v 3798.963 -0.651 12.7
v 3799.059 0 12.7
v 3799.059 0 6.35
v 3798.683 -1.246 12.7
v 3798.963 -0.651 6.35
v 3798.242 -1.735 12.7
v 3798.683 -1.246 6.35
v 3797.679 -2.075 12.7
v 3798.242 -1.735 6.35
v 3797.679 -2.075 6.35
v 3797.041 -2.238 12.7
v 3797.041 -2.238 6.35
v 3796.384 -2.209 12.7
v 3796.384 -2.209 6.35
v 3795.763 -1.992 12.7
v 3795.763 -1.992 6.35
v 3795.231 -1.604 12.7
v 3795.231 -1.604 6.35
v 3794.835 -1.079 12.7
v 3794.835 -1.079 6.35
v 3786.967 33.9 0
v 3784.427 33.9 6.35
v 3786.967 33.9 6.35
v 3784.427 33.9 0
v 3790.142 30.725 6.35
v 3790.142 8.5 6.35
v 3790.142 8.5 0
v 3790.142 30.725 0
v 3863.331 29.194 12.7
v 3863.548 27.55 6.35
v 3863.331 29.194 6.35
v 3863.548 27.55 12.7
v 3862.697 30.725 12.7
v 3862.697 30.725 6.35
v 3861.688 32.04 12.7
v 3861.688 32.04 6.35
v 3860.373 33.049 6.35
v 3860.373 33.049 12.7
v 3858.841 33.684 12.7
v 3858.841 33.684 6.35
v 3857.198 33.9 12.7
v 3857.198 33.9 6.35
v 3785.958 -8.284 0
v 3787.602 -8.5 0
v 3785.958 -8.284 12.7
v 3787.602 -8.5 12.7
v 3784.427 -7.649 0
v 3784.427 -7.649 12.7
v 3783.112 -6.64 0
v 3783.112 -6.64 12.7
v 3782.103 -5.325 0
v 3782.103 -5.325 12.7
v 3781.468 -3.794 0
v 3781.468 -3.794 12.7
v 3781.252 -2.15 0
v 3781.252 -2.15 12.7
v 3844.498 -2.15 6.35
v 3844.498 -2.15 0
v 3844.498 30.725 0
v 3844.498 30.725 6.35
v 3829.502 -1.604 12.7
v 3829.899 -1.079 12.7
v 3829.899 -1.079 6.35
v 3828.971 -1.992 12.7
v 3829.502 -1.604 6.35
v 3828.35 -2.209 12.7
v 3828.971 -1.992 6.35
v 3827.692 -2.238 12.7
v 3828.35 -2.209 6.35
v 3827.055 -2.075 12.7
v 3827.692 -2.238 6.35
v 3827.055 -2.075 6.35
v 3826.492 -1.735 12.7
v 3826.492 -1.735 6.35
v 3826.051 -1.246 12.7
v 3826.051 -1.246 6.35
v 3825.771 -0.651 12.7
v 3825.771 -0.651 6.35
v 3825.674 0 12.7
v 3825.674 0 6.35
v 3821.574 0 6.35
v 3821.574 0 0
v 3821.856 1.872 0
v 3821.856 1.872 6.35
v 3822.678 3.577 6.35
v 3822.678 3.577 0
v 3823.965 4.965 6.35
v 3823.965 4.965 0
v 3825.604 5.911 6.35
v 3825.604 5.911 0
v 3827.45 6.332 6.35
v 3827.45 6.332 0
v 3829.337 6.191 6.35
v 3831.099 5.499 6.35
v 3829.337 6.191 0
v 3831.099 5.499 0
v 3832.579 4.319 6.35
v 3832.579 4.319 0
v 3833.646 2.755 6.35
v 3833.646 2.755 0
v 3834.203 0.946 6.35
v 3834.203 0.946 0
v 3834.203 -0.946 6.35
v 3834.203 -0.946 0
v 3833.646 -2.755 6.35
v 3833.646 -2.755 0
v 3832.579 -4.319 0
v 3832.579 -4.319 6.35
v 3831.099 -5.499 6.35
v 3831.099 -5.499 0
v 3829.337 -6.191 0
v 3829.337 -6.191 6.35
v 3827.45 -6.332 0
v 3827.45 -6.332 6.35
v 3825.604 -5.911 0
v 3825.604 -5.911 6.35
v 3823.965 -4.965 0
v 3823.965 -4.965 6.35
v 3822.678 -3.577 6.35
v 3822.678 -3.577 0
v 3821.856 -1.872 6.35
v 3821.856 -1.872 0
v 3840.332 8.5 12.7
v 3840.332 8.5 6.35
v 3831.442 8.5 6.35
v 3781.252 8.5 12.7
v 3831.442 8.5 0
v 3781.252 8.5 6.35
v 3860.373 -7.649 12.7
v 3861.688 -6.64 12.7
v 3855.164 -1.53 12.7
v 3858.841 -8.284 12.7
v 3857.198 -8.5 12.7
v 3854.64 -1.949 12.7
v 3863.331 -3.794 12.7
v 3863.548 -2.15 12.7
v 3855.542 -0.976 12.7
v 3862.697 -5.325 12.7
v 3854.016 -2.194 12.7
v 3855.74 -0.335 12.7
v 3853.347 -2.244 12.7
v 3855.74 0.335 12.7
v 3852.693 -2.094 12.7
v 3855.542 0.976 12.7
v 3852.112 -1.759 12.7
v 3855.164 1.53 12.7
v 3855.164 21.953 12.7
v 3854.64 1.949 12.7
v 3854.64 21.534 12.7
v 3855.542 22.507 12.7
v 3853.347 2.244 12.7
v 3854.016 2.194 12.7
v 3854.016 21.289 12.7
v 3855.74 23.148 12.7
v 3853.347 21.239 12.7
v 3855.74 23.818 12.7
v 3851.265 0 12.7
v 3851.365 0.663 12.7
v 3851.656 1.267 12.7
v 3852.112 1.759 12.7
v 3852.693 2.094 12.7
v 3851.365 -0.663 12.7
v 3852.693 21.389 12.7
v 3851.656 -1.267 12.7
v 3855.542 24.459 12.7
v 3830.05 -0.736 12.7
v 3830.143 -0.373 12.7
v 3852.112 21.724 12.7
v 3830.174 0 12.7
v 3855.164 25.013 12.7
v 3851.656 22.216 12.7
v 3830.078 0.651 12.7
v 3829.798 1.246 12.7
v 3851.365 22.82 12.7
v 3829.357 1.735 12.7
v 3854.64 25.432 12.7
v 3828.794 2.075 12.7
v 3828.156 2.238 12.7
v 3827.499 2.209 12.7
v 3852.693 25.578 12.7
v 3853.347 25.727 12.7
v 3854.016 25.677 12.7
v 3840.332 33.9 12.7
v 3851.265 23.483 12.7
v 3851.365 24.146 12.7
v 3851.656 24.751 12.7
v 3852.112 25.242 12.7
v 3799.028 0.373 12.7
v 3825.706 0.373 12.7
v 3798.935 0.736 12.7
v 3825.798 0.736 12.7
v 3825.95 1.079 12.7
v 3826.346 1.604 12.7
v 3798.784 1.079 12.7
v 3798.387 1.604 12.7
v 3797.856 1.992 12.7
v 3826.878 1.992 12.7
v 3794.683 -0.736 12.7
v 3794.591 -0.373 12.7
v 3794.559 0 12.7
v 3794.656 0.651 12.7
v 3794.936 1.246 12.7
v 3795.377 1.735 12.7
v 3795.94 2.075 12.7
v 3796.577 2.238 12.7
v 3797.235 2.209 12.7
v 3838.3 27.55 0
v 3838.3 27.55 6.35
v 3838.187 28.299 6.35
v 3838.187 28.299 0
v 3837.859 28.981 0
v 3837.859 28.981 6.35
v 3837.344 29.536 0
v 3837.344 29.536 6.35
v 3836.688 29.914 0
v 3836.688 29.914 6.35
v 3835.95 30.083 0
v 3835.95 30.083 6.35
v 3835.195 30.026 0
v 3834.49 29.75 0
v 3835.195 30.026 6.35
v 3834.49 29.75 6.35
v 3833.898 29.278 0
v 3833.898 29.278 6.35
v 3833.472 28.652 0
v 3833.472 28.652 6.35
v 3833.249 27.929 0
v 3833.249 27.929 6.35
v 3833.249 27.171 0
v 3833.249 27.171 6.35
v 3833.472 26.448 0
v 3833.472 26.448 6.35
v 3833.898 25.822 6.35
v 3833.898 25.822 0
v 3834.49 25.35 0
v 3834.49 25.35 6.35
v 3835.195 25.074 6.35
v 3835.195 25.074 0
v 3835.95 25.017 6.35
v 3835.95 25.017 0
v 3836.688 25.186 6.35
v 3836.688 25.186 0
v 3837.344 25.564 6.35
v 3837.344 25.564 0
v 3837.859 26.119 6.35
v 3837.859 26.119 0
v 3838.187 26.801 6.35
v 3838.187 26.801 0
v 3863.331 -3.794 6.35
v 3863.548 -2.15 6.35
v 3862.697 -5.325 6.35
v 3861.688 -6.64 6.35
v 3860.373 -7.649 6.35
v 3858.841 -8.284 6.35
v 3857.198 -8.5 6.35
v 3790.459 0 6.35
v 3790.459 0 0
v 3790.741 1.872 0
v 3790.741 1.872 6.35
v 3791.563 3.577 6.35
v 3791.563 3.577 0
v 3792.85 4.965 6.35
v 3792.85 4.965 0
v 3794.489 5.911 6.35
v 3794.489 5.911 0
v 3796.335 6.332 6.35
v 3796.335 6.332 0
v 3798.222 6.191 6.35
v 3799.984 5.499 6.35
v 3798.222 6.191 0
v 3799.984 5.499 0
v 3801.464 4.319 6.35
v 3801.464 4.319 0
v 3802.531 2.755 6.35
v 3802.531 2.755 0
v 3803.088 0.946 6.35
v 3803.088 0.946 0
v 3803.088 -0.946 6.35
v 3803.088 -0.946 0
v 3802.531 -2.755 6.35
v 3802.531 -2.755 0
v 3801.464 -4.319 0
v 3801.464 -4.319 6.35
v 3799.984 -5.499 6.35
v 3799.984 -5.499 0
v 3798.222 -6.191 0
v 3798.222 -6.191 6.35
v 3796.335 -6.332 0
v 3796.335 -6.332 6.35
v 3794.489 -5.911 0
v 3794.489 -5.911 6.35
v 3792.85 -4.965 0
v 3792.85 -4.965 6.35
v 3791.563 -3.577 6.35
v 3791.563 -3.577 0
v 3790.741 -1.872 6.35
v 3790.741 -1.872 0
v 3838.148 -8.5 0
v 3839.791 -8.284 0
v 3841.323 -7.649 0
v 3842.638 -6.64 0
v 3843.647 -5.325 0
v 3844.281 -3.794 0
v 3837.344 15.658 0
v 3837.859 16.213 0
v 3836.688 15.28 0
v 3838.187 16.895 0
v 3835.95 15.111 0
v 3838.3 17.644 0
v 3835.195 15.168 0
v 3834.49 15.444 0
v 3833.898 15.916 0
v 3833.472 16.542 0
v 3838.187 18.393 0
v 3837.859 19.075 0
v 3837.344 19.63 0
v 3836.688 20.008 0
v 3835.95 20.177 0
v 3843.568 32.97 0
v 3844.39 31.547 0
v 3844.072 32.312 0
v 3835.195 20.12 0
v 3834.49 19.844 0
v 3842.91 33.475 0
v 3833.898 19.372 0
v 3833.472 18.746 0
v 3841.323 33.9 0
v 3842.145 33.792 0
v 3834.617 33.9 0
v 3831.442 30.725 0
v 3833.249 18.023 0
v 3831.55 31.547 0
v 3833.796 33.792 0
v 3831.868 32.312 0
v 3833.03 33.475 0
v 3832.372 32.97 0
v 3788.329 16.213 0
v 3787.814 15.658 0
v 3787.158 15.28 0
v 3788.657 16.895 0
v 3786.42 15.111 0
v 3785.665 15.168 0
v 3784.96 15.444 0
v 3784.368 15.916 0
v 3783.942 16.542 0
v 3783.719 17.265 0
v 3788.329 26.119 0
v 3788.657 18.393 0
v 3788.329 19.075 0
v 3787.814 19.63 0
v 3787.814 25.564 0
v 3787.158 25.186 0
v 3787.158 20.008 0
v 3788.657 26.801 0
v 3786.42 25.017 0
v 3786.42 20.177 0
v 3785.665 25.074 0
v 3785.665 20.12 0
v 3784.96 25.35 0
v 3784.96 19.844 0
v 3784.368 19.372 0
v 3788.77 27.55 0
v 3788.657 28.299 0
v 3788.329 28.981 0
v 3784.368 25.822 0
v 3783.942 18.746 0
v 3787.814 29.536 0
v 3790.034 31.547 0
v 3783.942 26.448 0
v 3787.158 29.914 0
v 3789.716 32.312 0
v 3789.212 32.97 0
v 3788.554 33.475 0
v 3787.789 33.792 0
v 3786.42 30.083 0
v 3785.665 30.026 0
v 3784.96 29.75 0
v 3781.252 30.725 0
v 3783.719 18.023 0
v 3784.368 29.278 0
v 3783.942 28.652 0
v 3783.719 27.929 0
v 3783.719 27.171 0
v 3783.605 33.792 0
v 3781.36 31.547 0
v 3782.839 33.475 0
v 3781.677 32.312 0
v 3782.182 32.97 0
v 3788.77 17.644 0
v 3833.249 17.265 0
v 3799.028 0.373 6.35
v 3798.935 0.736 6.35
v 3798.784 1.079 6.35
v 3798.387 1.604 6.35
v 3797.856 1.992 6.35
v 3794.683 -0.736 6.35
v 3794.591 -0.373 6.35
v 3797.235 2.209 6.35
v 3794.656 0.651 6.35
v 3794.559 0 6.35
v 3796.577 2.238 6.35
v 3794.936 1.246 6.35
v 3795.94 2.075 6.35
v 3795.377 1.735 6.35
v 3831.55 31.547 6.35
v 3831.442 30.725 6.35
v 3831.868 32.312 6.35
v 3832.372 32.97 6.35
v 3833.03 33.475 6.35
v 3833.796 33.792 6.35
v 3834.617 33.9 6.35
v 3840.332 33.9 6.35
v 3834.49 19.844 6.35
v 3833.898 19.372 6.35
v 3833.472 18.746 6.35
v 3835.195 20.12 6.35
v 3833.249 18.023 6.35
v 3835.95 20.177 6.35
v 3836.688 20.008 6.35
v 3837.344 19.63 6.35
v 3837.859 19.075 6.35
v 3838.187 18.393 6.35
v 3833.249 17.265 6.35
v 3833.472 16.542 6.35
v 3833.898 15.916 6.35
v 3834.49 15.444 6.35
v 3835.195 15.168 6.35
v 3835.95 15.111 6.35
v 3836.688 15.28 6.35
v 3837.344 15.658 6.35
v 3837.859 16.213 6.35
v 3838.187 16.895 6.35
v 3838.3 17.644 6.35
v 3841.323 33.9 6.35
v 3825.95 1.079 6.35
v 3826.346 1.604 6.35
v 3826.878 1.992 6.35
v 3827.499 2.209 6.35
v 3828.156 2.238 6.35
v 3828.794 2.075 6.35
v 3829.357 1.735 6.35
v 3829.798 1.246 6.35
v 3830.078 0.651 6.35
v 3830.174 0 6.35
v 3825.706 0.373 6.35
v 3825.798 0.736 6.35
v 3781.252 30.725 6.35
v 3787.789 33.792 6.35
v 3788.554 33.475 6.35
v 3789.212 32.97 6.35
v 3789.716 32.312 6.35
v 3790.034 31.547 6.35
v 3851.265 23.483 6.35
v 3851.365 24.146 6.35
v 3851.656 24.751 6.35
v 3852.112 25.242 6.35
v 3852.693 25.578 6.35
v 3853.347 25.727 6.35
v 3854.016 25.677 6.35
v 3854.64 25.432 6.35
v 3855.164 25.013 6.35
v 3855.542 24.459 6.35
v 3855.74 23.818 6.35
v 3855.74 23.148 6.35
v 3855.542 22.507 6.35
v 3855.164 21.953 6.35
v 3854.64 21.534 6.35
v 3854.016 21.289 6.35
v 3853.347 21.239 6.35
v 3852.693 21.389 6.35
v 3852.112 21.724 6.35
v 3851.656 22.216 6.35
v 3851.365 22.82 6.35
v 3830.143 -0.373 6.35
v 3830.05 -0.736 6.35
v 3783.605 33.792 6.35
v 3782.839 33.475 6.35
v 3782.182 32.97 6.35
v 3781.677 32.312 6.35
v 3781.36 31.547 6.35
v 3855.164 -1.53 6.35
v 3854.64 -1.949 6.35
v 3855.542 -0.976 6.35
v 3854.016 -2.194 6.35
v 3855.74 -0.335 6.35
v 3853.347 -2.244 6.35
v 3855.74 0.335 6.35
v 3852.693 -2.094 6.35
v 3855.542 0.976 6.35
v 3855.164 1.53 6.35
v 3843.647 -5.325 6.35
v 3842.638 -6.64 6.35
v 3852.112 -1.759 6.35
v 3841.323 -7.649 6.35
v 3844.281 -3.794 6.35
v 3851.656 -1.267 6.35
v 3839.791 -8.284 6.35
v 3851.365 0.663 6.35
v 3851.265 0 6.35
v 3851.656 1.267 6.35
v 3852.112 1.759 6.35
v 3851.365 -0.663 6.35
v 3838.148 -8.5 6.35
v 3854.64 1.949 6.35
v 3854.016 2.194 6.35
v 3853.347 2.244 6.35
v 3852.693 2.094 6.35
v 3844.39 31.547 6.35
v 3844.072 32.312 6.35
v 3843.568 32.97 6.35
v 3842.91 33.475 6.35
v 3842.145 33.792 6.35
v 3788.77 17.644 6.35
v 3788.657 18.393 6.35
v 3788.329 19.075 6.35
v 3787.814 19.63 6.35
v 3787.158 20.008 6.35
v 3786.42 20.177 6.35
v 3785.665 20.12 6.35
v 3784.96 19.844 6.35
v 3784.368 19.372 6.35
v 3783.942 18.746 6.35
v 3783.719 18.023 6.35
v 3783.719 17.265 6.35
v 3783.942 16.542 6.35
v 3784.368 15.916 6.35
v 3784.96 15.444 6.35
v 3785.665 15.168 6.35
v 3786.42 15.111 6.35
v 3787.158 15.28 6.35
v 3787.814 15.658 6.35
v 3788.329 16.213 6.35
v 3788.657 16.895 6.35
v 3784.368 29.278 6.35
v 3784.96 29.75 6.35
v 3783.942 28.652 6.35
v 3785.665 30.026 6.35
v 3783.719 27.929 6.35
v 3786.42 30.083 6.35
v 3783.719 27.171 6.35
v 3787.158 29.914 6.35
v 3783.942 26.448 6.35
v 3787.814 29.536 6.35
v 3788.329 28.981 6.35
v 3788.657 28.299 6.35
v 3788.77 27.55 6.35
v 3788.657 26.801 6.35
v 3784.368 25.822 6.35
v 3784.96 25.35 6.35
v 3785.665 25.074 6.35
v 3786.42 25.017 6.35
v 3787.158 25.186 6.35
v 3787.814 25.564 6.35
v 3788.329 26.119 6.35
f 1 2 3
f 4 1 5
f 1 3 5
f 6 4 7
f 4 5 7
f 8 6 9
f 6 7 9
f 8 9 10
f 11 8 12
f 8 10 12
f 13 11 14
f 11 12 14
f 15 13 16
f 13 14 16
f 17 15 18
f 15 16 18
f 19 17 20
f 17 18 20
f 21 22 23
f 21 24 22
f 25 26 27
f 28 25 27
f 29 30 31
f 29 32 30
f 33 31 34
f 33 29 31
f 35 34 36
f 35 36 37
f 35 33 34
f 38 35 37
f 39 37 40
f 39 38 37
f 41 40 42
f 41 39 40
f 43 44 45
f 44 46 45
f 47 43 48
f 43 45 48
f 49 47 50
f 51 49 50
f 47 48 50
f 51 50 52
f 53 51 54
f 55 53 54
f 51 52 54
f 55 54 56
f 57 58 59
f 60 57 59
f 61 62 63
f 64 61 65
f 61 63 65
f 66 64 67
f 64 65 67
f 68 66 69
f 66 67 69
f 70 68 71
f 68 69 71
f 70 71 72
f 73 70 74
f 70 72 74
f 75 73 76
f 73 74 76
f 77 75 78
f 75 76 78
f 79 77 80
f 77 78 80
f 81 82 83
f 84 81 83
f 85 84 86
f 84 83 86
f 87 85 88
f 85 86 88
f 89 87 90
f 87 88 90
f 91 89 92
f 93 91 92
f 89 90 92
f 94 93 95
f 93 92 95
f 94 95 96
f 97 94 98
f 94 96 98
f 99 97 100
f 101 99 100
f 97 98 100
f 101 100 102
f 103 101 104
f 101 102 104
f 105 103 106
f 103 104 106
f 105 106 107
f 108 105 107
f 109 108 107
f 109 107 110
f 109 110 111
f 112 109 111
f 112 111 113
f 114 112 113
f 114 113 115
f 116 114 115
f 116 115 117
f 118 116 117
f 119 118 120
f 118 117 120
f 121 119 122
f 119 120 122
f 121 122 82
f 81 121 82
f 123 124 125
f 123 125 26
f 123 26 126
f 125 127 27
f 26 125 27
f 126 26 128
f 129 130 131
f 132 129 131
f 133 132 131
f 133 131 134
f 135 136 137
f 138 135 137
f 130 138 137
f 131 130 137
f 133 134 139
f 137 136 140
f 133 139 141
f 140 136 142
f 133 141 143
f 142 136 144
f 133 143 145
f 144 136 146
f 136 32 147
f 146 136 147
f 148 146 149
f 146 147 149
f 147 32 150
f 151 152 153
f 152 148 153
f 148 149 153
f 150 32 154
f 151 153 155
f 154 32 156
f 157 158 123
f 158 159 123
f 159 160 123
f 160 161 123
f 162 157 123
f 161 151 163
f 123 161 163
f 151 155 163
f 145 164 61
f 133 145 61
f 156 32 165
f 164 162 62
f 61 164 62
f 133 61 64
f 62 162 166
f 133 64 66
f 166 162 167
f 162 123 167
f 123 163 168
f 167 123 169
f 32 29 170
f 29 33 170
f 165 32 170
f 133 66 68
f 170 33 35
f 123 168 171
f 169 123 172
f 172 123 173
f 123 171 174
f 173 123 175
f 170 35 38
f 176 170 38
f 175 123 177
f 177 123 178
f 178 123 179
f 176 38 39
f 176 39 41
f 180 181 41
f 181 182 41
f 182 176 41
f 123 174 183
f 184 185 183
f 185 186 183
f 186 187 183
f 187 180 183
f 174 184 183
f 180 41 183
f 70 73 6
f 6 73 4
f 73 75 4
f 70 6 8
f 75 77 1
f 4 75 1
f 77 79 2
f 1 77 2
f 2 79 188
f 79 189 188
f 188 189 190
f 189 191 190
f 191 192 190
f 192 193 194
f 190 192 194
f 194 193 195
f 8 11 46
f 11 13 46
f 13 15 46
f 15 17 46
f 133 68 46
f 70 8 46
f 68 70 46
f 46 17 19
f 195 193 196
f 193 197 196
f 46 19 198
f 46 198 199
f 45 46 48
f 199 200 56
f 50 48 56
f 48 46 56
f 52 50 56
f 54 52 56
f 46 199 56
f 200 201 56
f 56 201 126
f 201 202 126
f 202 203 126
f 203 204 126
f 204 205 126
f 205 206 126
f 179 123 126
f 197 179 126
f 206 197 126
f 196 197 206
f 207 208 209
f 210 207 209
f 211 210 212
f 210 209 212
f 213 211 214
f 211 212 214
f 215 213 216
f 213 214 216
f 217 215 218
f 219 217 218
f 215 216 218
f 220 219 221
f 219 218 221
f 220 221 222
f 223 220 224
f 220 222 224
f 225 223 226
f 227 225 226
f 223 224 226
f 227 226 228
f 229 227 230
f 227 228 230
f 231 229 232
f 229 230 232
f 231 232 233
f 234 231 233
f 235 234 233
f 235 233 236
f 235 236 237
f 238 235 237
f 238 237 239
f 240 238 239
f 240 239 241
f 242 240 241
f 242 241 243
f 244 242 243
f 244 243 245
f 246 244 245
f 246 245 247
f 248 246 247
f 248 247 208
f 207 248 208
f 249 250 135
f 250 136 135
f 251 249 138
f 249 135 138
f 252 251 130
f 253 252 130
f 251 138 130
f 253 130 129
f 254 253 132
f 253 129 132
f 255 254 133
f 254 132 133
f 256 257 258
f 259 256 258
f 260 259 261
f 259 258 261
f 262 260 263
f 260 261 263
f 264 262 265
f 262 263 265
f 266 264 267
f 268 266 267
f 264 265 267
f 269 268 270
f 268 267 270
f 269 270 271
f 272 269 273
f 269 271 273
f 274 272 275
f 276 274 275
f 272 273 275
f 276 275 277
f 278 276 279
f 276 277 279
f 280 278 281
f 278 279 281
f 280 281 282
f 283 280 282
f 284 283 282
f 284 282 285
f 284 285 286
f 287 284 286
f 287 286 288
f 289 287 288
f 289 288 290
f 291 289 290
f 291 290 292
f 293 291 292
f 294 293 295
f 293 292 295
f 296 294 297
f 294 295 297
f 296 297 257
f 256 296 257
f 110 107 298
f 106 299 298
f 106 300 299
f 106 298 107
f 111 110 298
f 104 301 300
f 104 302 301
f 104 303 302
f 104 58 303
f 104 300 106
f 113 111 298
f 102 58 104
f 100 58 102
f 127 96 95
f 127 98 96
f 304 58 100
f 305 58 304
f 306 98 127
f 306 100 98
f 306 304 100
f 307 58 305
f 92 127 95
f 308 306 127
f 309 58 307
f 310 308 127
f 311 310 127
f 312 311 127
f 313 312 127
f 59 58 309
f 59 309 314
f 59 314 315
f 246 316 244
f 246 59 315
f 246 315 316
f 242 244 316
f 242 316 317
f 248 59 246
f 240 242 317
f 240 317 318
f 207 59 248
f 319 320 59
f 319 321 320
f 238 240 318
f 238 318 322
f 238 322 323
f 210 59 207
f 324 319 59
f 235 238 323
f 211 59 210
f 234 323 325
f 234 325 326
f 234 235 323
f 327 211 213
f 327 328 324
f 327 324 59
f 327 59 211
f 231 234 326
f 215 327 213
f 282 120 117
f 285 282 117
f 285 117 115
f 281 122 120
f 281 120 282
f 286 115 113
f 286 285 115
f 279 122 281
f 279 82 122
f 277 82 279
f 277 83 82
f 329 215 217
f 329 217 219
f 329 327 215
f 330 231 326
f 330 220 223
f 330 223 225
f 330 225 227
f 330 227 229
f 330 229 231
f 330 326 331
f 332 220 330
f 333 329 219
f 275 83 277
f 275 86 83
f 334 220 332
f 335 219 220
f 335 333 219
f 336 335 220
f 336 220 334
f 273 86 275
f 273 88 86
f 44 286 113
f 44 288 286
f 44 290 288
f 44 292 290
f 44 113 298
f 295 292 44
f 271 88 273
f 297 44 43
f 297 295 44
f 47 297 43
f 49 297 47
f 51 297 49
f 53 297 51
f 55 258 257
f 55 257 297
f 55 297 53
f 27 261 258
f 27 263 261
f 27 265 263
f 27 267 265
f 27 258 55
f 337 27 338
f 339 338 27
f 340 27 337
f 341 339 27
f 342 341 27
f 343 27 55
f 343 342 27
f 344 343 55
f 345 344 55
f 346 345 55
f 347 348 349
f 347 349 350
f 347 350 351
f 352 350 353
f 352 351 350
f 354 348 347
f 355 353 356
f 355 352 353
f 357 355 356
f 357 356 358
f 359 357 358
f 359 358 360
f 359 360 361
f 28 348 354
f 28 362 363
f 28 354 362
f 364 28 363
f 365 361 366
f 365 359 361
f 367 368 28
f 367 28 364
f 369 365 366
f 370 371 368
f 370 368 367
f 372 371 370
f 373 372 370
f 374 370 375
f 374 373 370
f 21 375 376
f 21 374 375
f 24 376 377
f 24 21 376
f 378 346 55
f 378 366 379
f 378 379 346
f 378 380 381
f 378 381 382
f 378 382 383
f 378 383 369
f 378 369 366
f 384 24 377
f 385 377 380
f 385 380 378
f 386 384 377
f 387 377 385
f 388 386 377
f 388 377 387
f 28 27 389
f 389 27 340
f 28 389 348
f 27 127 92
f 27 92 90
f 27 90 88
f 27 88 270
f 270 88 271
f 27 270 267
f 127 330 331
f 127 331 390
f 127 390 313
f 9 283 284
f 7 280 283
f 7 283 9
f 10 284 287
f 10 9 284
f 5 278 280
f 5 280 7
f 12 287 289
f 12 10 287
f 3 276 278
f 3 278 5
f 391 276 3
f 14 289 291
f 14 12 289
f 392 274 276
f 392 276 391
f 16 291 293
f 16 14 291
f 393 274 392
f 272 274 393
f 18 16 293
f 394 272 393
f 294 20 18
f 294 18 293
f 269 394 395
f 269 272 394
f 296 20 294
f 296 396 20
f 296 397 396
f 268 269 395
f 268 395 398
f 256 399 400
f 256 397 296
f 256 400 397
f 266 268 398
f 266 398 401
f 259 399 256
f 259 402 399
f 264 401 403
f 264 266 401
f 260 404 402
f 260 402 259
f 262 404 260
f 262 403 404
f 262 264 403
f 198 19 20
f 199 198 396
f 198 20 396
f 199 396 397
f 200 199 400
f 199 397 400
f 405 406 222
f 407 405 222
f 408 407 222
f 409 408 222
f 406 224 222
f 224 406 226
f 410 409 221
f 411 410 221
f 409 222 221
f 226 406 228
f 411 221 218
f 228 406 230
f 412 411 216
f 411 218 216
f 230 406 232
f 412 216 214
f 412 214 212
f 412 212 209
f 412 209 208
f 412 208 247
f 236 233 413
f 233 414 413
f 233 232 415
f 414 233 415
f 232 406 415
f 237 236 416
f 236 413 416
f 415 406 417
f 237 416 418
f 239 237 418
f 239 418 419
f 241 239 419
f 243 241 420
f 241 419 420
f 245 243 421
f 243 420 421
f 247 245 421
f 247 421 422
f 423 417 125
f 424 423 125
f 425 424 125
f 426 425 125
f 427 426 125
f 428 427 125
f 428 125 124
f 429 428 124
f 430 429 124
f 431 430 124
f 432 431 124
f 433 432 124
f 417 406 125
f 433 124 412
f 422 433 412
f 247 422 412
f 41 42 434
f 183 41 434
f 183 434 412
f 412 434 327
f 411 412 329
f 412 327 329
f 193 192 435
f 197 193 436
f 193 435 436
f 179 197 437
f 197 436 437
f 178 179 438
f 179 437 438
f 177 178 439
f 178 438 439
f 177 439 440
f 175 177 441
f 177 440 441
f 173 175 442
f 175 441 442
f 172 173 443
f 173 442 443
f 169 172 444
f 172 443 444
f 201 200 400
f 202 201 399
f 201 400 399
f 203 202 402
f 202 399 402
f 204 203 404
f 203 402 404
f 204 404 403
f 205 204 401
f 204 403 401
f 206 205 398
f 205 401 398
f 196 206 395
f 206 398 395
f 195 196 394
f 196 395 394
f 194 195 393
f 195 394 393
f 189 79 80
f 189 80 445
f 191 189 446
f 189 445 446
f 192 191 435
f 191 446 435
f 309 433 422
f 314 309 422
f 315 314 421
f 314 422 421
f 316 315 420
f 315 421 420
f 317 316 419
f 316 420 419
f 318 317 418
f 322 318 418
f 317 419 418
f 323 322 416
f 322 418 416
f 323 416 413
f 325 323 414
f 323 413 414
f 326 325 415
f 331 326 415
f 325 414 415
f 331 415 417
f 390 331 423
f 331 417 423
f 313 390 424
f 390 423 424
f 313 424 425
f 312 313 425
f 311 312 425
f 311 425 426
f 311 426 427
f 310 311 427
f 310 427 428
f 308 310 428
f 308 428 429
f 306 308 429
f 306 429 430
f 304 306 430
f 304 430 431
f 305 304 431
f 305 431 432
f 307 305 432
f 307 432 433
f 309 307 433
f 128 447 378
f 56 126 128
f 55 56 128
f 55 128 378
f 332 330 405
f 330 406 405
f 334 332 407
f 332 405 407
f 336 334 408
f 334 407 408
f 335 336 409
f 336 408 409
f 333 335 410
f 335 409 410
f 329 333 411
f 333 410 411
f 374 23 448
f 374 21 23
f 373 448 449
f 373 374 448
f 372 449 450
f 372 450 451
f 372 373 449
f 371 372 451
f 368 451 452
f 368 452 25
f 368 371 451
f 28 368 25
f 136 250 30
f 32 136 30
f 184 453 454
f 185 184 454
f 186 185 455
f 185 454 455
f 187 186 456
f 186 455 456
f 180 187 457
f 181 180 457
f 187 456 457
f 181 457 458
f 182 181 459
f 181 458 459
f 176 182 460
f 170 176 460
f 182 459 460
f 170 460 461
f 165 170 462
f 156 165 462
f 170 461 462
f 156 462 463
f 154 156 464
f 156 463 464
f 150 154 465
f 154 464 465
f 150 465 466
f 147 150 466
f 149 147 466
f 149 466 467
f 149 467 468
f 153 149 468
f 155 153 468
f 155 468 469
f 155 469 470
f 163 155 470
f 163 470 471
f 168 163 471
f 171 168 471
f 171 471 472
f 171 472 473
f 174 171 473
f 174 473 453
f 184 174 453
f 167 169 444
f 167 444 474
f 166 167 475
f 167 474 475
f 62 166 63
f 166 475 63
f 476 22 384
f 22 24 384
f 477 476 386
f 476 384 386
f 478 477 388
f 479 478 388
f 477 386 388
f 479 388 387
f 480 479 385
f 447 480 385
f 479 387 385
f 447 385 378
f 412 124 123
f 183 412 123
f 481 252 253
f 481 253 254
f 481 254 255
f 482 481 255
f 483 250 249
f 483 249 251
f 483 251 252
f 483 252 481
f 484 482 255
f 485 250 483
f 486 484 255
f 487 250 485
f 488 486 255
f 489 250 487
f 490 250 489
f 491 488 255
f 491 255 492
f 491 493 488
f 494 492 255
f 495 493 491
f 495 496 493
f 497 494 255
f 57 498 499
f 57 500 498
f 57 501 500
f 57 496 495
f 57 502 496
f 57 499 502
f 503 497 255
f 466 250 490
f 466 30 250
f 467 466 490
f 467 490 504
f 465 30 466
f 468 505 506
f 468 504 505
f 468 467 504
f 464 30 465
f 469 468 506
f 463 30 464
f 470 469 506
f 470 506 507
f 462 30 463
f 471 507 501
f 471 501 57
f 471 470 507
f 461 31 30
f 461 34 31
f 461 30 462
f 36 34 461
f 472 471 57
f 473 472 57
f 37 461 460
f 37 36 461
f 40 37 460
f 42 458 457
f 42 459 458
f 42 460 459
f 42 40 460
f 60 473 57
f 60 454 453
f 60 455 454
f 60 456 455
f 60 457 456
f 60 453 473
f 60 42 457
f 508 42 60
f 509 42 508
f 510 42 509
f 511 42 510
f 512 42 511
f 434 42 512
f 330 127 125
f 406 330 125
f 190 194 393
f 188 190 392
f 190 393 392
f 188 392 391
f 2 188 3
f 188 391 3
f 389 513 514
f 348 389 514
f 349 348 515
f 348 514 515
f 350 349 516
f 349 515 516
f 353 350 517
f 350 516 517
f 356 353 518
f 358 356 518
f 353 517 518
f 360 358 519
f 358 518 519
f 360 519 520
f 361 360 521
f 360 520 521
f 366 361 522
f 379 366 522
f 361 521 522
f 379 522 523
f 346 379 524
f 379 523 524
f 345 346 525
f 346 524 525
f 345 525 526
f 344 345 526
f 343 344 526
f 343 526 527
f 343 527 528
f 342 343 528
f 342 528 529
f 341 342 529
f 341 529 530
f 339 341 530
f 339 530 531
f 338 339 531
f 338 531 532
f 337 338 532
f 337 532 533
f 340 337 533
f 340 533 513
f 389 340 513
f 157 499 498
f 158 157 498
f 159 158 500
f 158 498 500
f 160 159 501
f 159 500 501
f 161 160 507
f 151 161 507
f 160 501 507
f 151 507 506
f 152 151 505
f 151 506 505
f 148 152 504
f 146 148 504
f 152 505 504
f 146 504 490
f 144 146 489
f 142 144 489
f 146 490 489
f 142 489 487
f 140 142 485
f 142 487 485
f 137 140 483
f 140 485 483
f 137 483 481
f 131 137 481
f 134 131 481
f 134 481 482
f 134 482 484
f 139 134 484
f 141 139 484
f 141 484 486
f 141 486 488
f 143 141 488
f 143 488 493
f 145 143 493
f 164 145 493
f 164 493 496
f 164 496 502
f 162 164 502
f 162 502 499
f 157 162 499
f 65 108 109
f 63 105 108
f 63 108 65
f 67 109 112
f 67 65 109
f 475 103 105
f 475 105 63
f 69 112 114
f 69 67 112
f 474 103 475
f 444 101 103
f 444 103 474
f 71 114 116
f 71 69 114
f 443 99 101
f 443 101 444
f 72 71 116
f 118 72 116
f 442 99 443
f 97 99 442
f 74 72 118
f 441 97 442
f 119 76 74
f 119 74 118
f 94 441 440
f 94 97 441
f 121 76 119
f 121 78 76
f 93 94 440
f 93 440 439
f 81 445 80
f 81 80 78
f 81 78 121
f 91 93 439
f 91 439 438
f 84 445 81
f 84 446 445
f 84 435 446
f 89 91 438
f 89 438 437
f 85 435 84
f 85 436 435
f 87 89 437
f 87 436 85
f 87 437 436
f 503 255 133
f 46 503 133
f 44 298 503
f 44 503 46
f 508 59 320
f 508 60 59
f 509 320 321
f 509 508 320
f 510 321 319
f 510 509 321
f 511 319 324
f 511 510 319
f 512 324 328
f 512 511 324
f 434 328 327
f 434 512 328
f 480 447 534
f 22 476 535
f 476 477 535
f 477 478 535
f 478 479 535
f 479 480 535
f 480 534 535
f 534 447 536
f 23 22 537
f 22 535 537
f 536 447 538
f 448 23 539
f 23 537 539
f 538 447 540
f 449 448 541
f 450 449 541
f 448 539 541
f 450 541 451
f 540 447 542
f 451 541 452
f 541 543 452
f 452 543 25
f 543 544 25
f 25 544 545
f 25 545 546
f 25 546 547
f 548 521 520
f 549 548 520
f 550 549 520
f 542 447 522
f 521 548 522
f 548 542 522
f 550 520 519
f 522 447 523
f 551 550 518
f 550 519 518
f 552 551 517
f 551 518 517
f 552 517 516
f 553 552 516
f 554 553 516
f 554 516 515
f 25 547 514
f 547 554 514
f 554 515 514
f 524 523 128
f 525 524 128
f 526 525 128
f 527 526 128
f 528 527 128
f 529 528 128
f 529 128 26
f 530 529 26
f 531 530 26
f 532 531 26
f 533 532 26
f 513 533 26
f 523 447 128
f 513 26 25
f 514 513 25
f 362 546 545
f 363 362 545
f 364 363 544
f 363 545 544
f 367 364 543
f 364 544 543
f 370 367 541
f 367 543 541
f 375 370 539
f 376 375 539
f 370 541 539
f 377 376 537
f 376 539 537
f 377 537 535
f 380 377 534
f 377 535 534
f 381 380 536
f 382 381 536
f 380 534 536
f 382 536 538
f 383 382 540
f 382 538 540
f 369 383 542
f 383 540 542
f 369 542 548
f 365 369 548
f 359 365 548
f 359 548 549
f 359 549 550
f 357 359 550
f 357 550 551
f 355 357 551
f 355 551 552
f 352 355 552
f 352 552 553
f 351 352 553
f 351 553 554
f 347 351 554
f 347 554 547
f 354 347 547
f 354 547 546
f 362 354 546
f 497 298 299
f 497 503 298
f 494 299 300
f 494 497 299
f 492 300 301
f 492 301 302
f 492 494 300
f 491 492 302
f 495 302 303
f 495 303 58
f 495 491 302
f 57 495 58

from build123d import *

# Parameters (mm, degrees)
BOSS_EXTRUDE1_DEPTH = 12.7
BOSS_EXTRUDE2_DEPTH = 25.4
SKETCH4_W           = 8.89
SKETCH4_H           = 6.35
BOSS_EXTRUDE3_DEPTH = 25.4
SKETCH5_R           = 2.54
CUT_EXTRUDE1_DEPTH  = 7.35
SKETCH6_W           = 20.066
SKETCH6_H           = 42.4
SKETCH6_R           = 2.25
BOSS_EXTRUDE4_DEPTH = 12.7
SKETCH7_R           = 6.35
SKETCH7_R_2         = 2.25
CUT_EXTRUDE2_DEPTH  = 6.35
SKETCH8_W           = 19.05
SKETCH8_H           = 42.4
CUT_EXTRUDE3_DEPTH  = 6.35
FILLET1_R           = 6.35
FILLET2_R           = 3.175


with BuildPart() as part:
    # Sketch1 → Boss-Extrude1 (new body)
    with BuildSketch(Plane.XY):
        Polygon((3833.667818581, -3.138), (3791.065892699, -3.138), (3781.25185564, -8.5), (3843.48185564, -8.5), align=None)
        with BuildLine():
            Line((3825.67435564, 0), (3799.05935564, 0))
            ThreePointArc((3799.05935564, 0), (3797.366063058, -2.180040562), (3794.834842884, -1.078795335))
            Line((3794.834842884, -1.078795335), (3791.065892699, -3.138))
            Line((3791.065892699, -3.138), (3833.667818581, -3.138))
            Line((3833.667818581, -3.138), (3829.898868396, -1.078795335))
            ThreePointArc((3829.898868396, -1.078795335), (3827.367648222, -2.180040562), (3825.67435564, 0))
        make_face()
        with BuildLine():
            Line((3843.48185564, -3.138), (3843.48185564, 0))
            Line((3843.48185564, 0), (3830.17435564, 0))
            ThreePointArc((3830.17435564, 0), (3830.104396202, -0.556707418), (3829.898868396, -1.078795335))
            Line((3829.898868396, -1.078795335), (3833.667818581, -3.138))
            Line((3833.667818581, -3.138), (3843.48185564, -3.138))
        make_face()
        Polygon((3812.36685564, 8.5), (3822.180892699, 3.138), (3843.48185564, 3.138), (3843.48185564, 8.5), align=None)
        with BuildLine():
            Line((3843.48185564, 3.138), (3822.180892699, 3.138))
            Line((3822.180892699, 3.138), (3825.949842884, 1.078795335))
            ThreePointArc((3825.949842884, 1.078795335), (3828.481063058, 2.180040562), (3830.17435564, 0))
            Line((3830.17435564, 0), (3843.48185564, 0))
            Line((3843.48185564, 0), (3843.48185564, 3.138))
        make_face()
        with BuildLine():
            Line((3822.180892699, 3.138), (3802.552818581, 3.138))
            Line((3802.552818581, 3.138), (3798.783868396, 1.078795335))
            ThreePointArc((3798.783868396, 1.078795335), (3798.989396202, 0.556707418), (3799.05935564, 0))
            Line((3799.05935564, 0), (3825.67435564, 0))
            ThreePointArc((3825.67435564, 0), (3825.744315078, 0.556707418), (3825.949842884, 1.078795335))
            Line((3825.949842884, 1.078795335), (3822.180892699, 3.138))
        make_face()
        Polygon((3812.36685564, 8.5), (3802.552818581, 3.138), (3822.180892699, 3.138), align=None)
        Polygon((3781.25185564, 8.5), (3781.25185564, 3.138), (3802.552818581, 3.138), (3812.36685564, 8.5), align=None)
        with BuildLine():
            Line((3802.552818581, 3.138), (3781.25185564, 3.138))
            Line((3781.25185564, 3.138), (3781.25185564, 0))
            Line((3781.25185564, 0), (3794.55935564, 0))
            ThreePointArc((3794.55935564, 0), (3796.252648222, 2.180040562), (3798.783868396, 1.078795335))
            Line((3798.783868396, 1.078795335), (3802.552818581, 3.138))
        make_face()
        with BuildLine():
            Line((3794.55935564, 0), (3781.25185564, 0))
            Line((3781.25185564, 0), (3781.25185564, -3.138))
            Line((3781.25185564, -3.138), (3791.065892699, -3.138))
            Line((3791.065892699, -3.138), (3794.834842884, -1.078795335))
            ThreePointArc((3794.834842884, -1.078795335), (3794.629315078, -0.556707418), (3794.55935564, 0))
        make_face()
        Polygon((3791.065892699, -3.138), (3781.25185564, -3.138), (3781.25185564, -8.5), align=None)
        Polygon((3843.48185564, -3.138), (3833.667818581, -3.138), (3843.48185564, -8.5), align=None)
    extrude(amount=BOSS_EXTRUDE1_DEPTH)

    # Sketch3 → Boss-Extrude2 (add)
    with BuildSketch(Plane(origin=(0, 8.5, 0), x_dir=(1, 0, 0), z_dir=(0, 1, 0))):
        Polygon((3831.44225564, 0), (3831.44225564, -6.35), (3840.33225564, -6.35), (3840.33225564, -12.7), (3843.48185564, -12.7), (3843.48185564, 0), align=None)
    extrude(amount=BOSS_EXTRUDE2_DEPTH)

    # Sketch4 → Boss-Extrude3 (add)
    with BuildSketch(Plane(origin=(0, 8.5, 0), x_dir=(1, 0, 0), z_dir=(0, 1, 0))):
        with Locations((3785.69685564, -3.175)):
            Rectangle(SKETCH4_W, SKETCH4_H)
    extrude(amount=BOSS_EXTRUDE3_DEPTH)

    # Sketch5 → Cut-Extrude1 (cut, through all)
    with BuildSketch(Plane.XY.offset(6.35)):
        with Locations((3835.76025564, 27.55)):
            Circle(SKETCH5_R)
        with Locations((3835.76025564, 17.644)):
            Circle(SKETCH5_R)
        with Locations((3786.23025564, 17.644)):
            Circle(SKETCH5_R)
        with Locations((3786.23025564, 27.55)):
            Circle(SKETCH5_R)
    extrude(amount=-CUT_EXTRUDE1_DEPTH, mode=Mode.SUBTRACT)

    # Sketch6 → Boss-Extrude4 (add)
    with BuildSketch(Plane(origin=(0, 0, 0), x_dir=(-1, 0, 0), z_dir=(0, 0, -1))):
        with Locations((-3853.51485564, 12.7)):
            Rectangle(SKETCH6_W, SKETCH6_H)
        with Locations((-3853.51485564, 0)):
            Circle(SKETCH6_R, mode=Mode.SUBTRACT)
        with Locations((-3853.51485564, 23.4830509)):
            Circle(SKETCH6_R, mode=Mode.SUBTRACT)
    extrude(amount=-BOSS_EXTRUDE4_DEPTH)

    # Sketch7 → Cut-Extrude2 (cut)
    with BuildSketch(Plane(origin=(0, 0, 0), x_dir=(-1, 0, 0), z_dir=(0, 0, -1))):
        with Locations((-3827.92435564, 0)):
            Circle(SKETCH7_R)
        with Locations((-3827.92435564, 0)):
            Circle(SKETCH7_R_2, mode=Mode.SUBTRACT)
        with Locations((-3796.80935564, 0)):
            Circle(SKETCH7_R)
        with Locations((-3796.80935564, 0)):
            Circle(SKETCH7_R_2, mode=Mode.SUBTRACT)
    extrude(amount=-CUT_EXTRUDE2_DEPTH, mode=Mode.SUBTRACT)

    # Sketch8 → Cut-Extrude3 (cut)
    with BuildSketch(Plane(origin=(0, 0, 0), x_dir=(-1, 0, 0), z_dir=(0, 0, -1))):
        with Locations((-3854.02285564, 12.7)):
            Rectangle(SKETCH8_W, SKETCH8_H)
    extrude(amount=-CUT_EXTRUDE3_DEPTH, mode=Mode.SUBTRACT)

    # Fillet1
    fillet1_edges = [part.edges().sort_by_distance(p)[0] for p in [
        (3844.49785564, -8.5, 3.175),
        (3781.25185564, -8.5, 6.35),
        (3863.54785564, 33.9, 9.525),
        (3863.54785564, -8.5, 9.525),
    ]]
    fillet(fillet1_edges, radius=FILLET1_R)

    # Fillet2
    fillet2_edges = [part.edges().sort_by_distance(p)[0] for p in [
        (3844.49785564, 33.9, 3.175),
        (3831.44225564, 33.9, 3.175),
        (3781.25185564, 33.9, 3.175),
        (3790.14185564, 33.9, 3.175),
    ]]
    fillet(fillet2_edges, radius=FILLET2_R)


solid = part.part
